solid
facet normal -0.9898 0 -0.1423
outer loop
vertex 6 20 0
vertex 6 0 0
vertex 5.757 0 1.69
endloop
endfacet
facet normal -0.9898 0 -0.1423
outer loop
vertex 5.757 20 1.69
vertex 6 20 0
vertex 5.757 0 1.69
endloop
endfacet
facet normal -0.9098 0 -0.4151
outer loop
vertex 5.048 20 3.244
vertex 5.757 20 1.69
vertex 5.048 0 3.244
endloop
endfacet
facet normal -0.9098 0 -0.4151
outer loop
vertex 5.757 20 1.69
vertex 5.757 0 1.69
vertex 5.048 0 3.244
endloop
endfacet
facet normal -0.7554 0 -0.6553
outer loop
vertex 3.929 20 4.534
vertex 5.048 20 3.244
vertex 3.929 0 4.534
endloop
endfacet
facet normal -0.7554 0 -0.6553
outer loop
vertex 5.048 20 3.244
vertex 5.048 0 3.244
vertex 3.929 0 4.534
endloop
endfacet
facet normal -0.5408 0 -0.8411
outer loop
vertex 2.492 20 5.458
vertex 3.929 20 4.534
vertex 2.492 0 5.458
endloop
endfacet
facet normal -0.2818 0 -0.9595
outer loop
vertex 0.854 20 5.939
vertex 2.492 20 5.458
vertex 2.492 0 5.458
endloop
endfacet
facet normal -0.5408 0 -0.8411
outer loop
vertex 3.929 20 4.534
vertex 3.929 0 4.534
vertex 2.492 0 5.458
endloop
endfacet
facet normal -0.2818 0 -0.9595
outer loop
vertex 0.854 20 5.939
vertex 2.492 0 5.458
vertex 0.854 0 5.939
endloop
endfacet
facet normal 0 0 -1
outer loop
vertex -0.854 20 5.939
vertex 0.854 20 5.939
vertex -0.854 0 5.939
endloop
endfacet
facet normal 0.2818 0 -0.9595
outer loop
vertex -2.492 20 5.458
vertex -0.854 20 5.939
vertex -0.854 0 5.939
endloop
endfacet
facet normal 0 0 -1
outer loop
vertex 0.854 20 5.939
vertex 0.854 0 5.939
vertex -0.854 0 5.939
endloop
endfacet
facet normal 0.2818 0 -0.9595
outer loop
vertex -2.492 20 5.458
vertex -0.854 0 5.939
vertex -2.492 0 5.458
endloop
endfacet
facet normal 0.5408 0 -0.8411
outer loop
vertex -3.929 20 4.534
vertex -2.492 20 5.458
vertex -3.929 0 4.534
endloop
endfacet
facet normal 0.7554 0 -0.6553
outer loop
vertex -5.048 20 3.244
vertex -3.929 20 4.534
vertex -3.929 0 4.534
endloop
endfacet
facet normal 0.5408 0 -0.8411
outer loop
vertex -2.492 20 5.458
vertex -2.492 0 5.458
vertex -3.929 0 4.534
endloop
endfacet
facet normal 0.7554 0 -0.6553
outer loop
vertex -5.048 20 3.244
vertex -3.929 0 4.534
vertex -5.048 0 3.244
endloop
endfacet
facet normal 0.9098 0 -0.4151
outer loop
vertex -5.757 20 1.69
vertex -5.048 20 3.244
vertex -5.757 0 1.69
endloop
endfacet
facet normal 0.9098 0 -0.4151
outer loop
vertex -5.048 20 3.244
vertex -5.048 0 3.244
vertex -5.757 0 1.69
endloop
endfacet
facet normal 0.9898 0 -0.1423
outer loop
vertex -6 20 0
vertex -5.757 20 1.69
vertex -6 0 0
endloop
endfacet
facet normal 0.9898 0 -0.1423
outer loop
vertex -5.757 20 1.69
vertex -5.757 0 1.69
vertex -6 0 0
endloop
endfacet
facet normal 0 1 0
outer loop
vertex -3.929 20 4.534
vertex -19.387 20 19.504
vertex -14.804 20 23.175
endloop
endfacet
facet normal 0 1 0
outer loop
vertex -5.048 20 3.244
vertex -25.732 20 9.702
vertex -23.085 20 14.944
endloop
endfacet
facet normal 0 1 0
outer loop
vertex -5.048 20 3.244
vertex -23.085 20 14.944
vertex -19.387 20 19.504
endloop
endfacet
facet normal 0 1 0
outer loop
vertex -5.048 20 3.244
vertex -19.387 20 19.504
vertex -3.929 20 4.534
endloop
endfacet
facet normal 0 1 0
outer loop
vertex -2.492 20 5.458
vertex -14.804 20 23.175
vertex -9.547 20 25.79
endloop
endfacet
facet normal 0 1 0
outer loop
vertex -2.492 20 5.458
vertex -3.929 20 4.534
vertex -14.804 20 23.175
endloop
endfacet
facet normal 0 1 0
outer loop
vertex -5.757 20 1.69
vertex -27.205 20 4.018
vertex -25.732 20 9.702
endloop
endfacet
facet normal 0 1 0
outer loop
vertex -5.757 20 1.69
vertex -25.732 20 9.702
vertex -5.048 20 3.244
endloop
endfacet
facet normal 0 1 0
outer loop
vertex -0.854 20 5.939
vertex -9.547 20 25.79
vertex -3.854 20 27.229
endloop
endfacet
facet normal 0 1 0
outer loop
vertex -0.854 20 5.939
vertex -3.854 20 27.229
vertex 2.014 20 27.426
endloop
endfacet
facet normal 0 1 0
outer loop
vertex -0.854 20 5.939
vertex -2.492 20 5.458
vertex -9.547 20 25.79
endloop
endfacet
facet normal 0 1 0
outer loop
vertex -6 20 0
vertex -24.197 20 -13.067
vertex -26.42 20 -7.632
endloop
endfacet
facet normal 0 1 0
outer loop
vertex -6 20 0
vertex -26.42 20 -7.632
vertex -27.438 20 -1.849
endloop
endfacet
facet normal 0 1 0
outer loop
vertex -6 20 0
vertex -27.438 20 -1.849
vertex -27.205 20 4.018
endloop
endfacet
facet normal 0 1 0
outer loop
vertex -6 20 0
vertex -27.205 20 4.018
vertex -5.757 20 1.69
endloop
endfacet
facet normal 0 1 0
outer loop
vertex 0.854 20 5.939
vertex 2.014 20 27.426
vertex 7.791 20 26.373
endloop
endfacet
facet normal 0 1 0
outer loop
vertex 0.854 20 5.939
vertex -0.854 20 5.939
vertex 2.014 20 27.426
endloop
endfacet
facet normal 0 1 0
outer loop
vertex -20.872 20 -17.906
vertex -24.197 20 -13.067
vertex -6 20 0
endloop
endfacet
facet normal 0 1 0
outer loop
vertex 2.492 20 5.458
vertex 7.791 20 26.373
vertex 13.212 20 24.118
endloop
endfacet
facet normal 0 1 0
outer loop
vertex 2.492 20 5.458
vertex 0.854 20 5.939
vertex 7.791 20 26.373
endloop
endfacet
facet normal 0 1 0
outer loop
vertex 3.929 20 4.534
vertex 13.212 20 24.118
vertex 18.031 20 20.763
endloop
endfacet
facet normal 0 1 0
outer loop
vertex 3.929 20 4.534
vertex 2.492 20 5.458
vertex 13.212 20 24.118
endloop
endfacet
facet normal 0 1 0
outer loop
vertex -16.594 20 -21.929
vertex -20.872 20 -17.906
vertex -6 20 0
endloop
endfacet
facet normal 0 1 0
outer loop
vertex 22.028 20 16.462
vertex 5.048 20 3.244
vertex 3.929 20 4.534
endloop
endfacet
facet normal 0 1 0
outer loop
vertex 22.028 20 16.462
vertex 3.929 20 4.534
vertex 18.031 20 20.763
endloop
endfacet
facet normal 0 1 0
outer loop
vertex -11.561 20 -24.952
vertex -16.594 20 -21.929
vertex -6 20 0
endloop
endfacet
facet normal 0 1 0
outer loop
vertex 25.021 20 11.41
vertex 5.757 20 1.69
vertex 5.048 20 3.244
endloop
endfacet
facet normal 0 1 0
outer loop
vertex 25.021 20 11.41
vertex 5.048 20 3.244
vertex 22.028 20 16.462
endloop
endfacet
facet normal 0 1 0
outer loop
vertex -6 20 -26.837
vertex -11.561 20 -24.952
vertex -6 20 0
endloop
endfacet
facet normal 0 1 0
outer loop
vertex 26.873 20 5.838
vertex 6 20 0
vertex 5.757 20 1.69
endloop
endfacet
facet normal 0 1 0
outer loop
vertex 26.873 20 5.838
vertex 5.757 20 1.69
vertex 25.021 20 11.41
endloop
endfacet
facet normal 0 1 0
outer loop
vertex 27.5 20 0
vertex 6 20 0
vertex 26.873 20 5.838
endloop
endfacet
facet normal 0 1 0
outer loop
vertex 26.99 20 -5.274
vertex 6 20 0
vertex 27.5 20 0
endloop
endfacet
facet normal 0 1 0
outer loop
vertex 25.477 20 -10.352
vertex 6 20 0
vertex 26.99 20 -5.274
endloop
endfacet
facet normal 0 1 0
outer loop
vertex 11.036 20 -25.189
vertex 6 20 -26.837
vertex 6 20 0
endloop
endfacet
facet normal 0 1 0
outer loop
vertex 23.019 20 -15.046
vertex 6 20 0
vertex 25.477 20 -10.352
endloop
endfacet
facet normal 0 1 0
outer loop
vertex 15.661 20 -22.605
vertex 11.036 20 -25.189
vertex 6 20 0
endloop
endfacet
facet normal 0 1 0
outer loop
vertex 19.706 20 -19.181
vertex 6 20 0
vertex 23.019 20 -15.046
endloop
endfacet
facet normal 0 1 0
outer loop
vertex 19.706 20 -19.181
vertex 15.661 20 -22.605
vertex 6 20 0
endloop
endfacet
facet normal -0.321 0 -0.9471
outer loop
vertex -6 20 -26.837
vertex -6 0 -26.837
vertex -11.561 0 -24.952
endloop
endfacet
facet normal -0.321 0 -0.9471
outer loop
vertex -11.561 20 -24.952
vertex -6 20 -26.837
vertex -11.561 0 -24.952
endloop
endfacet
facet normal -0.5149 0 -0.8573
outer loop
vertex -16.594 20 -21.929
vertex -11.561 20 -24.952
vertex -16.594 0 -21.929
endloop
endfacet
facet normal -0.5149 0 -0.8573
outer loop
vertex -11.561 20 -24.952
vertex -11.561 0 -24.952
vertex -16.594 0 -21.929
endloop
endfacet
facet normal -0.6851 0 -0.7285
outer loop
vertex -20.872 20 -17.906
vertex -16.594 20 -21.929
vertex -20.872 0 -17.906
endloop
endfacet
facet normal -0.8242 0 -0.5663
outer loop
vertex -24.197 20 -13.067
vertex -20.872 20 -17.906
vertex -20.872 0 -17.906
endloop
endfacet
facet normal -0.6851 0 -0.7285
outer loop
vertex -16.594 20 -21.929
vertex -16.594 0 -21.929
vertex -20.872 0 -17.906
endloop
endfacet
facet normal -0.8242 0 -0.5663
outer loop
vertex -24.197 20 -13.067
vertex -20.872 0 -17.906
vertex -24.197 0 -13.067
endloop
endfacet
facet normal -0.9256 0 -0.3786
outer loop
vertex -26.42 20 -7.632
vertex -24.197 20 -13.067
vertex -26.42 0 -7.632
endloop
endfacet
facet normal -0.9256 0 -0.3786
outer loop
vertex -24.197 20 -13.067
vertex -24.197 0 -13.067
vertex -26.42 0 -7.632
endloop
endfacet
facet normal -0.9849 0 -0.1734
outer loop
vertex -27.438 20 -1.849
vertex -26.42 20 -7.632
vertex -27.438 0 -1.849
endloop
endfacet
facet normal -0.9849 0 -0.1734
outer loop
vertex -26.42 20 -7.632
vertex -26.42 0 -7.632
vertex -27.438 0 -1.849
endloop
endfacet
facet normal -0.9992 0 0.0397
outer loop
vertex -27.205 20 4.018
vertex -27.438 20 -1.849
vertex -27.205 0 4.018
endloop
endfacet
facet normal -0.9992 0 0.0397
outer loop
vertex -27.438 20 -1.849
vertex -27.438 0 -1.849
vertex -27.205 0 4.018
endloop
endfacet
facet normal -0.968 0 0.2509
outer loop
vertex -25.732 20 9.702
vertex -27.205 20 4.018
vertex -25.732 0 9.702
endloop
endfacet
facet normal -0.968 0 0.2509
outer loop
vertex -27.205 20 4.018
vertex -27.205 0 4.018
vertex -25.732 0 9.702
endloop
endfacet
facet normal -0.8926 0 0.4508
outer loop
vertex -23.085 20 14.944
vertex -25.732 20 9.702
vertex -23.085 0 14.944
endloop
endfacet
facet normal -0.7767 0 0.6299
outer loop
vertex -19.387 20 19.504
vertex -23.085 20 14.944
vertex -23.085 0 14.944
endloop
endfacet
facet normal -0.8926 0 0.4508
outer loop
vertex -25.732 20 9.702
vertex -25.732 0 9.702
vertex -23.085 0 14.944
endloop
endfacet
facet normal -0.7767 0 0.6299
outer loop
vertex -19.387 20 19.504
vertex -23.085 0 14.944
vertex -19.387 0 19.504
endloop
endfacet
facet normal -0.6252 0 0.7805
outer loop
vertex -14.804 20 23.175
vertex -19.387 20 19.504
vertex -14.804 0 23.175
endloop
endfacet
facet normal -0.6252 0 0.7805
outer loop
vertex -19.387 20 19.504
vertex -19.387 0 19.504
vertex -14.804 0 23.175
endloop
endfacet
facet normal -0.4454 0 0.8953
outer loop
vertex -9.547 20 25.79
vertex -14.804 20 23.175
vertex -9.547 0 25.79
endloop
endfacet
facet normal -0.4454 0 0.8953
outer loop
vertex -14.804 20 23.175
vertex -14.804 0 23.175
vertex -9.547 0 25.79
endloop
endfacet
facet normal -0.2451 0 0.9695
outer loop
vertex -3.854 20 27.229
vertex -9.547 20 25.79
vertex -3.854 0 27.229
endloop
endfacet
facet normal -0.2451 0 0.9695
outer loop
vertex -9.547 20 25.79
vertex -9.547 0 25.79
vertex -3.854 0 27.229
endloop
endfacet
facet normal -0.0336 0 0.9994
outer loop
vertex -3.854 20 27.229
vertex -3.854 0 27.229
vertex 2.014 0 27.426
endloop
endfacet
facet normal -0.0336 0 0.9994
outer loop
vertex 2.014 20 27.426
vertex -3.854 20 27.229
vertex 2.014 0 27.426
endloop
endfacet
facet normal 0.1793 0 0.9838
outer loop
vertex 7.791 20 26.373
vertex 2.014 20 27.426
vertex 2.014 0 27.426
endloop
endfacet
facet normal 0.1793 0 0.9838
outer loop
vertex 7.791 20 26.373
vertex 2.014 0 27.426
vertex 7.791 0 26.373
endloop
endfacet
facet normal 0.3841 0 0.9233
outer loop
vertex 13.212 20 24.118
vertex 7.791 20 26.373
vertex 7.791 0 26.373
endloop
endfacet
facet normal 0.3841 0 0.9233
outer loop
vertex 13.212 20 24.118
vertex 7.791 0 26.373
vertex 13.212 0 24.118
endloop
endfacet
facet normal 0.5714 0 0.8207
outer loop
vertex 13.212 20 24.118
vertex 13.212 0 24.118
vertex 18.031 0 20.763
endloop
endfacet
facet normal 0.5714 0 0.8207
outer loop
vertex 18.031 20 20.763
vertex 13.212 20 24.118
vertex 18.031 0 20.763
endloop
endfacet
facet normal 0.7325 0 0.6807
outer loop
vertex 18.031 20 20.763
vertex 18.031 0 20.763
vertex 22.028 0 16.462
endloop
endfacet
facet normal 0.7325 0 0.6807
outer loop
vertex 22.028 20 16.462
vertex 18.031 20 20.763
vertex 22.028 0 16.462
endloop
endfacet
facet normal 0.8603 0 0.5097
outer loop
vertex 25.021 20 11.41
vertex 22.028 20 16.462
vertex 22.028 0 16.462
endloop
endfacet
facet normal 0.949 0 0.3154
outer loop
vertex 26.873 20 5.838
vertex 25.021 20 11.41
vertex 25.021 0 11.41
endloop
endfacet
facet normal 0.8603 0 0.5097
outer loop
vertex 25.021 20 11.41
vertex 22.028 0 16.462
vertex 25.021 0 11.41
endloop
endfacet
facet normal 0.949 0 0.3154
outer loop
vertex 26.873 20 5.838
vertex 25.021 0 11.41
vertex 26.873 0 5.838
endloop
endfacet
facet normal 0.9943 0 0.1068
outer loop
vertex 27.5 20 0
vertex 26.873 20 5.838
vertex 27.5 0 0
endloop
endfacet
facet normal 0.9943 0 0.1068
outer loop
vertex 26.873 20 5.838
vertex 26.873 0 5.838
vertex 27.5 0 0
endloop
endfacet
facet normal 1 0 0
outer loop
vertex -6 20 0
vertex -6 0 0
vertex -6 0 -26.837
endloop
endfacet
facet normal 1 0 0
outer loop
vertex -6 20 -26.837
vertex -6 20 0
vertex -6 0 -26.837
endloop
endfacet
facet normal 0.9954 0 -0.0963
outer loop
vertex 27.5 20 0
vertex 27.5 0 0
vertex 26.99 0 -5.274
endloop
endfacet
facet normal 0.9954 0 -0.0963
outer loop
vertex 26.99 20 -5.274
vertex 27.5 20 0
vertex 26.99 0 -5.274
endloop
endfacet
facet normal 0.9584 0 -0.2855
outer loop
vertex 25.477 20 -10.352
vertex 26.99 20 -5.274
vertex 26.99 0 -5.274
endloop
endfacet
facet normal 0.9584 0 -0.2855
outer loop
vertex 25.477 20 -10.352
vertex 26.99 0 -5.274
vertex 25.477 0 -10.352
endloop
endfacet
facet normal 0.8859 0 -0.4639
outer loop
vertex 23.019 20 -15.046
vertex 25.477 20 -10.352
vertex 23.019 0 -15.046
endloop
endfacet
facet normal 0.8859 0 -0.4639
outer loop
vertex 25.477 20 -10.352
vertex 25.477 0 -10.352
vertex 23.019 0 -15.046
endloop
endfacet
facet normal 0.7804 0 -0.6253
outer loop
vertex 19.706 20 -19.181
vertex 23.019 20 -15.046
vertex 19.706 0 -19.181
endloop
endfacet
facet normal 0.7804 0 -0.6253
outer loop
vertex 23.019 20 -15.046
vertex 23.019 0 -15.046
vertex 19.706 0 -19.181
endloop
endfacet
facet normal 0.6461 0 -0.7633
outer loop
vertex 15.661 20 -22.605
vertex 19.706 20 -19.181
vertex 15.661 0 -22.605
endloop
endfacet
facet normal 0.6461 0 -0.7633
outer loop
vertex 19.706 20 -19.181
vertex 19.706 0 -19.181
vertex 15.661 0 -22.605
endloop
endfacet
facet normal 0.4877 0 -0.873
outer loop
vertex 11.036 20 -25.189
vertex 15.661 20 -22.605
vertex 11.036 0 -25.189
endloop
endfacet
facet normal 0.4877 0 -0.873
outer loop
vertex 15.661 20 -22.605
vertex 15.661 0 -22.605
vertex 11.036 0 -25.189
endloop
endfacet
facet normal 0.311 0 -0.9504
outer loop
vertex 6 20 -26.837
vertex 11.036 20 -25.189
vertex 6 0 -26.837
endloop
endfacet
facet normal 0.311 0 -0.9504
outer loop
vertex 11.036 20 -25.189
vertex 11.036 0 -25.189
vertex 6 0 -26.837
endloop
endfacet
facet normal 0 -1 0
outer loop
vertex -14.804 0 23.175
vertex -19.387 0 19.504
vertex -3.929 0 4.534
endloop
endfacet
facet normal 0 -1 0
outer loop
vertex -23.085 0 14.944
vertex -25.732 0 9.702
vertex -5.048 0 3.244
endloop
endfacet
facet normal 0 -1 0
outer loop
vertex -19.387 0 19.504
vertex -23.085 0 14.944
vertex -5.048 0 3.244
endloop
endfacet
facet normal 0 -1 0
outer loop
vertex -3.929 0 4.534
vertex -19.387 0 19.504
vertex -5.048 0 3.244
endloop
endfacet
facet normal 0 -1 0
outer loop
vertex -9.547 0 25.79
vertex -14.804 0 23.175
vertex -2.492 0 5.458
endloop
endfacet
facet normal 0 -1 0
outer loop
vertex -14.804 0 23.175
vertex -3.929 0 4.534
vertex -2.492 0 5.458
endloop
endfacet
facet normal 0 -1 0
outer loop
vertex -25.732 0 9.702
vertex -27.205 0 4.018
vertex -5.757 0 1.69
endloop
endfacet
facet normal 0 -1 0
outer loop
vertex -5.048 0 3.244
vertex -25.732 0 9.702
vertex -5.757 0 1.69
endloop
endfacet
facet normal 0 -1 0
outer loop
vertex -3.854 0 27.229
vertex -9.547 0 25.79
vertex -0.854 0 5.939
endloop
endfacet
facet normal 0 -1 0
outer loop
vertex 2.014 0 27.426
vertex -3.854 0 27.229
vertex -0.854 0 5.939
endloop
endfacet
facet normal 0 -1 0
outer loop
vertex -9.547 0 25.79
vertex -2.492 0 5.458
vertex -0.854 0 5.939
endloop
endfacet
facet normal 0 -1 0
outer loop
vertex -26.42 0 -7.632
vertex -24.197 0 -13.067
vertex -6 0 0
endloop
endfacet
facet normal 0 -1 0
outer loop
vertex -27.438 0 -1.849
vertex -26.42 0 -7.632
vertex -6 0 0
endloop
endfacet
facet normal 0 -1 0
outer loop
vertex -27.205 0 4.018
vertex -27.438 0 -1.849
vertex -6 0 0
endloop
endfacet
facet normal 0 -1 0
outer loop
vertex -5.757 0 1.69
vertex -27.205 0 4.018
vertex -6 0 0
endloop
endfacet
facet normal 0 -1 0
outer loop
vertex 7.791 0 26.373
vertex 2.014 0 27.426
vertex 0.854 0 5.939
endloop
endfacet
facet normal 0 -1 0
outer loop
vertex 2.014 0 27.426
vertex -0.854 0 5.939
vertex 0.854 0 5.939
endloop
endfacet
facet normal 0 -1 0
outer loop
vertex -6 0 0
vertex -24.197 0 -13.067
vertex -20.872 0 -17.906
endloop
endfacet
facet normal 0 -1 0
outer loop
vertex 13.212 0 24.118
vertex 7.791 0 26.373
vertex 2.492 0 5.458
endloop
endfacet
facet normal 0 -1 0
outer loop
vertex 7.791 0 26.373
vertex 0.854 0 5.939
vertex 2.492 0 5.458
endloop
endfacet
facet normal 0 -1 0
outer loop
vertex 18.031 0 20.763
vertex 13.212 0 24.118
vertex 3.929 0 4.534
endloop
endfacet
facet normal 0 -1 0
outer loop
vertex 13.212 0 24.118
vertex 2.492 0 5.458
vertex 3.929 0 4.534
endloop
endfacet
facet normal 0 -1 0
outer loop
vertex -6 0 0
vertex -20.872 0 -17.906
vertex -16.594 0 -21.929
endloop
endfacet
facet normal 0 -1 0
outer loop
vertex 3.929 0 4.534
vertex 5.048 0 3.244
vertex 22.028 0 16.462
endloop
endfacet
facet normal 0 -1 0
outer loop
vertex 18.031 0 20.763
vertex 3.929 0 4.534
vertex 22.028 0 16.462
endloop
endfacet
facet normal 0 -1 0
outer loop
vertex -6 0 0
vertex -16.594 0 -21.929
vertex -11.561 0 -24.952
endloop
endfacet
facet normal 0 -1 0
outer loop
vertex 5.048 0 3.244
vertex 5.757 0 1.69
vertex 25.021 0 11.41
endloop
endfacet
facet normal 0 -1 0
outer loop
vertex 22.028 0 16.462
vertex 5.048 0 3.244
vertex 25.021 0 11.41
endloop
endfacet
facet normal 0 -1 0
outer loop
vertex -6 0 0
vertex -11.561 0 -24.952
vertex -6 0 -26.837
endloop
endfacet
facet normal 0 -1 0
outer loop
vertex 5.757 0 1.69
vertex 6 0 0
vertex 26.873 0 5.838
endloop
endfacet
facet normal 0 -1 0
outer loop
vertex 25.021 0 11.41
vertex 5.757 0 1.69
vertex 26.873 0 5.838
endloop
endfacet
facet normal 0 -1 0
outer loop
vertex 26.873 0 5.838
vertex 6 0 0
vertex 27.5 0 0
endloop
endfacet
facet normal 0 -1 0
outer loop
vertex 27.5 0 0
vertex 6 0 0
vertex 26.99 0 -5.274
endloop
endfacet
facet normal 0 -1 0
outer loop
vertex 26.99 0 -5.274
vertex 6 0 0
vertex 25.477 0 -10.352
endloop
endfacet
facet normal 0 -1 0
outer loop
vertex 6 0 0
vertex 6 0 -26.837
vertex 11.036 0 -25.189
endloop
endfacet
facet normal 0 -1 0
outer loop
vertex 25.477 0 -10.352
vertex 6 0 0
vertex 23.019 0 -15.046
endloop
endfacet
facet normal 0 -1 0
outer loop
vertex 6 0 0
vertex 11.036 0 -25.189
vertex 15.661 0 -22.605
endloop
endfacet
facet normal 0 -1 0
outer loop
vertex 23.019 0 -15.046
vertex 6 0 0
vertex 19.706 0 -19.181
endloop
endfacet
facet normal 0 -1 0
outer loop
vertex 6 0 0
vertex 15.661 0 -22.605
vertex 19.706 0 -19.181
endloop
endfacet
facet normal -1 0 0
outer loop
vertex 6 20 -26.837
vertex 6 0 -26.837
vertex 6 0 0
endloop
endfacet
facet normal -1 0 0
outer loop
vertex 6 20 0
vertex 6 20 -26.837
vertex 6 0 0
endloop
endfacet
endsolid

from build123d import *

# Parameters (mm, degrees)
BOSS_EXTRUDE1_DEPTH = 20


with BuildPart() as part:
    # Sketch2 → Boss-Extrude1 (new body)
    with BuildSketch(Plane(origin=(0, 0, 0), x_dir=(1, 0, 0), z_dir=(0, 1, 0))):
        with BuildLine():
            ThreePointArc((6, 0), (0, -6), (-6, 0))
            Line((-6, 0), (-6, 26.837473801))
            ThreePointArc((-6, 26.837473801), (-17.193748864, -21.462176031), (27.5, 0))
            ThreePointArc((27.5, 0), (21.462176031, 17.193748864), (6, 26.837473801))
            Line((6, 26.837473801), (6, 0))
        make_face()
    extrude(amount=BOSS_EXTRUDE1_DEPTH)


solid = part.part
